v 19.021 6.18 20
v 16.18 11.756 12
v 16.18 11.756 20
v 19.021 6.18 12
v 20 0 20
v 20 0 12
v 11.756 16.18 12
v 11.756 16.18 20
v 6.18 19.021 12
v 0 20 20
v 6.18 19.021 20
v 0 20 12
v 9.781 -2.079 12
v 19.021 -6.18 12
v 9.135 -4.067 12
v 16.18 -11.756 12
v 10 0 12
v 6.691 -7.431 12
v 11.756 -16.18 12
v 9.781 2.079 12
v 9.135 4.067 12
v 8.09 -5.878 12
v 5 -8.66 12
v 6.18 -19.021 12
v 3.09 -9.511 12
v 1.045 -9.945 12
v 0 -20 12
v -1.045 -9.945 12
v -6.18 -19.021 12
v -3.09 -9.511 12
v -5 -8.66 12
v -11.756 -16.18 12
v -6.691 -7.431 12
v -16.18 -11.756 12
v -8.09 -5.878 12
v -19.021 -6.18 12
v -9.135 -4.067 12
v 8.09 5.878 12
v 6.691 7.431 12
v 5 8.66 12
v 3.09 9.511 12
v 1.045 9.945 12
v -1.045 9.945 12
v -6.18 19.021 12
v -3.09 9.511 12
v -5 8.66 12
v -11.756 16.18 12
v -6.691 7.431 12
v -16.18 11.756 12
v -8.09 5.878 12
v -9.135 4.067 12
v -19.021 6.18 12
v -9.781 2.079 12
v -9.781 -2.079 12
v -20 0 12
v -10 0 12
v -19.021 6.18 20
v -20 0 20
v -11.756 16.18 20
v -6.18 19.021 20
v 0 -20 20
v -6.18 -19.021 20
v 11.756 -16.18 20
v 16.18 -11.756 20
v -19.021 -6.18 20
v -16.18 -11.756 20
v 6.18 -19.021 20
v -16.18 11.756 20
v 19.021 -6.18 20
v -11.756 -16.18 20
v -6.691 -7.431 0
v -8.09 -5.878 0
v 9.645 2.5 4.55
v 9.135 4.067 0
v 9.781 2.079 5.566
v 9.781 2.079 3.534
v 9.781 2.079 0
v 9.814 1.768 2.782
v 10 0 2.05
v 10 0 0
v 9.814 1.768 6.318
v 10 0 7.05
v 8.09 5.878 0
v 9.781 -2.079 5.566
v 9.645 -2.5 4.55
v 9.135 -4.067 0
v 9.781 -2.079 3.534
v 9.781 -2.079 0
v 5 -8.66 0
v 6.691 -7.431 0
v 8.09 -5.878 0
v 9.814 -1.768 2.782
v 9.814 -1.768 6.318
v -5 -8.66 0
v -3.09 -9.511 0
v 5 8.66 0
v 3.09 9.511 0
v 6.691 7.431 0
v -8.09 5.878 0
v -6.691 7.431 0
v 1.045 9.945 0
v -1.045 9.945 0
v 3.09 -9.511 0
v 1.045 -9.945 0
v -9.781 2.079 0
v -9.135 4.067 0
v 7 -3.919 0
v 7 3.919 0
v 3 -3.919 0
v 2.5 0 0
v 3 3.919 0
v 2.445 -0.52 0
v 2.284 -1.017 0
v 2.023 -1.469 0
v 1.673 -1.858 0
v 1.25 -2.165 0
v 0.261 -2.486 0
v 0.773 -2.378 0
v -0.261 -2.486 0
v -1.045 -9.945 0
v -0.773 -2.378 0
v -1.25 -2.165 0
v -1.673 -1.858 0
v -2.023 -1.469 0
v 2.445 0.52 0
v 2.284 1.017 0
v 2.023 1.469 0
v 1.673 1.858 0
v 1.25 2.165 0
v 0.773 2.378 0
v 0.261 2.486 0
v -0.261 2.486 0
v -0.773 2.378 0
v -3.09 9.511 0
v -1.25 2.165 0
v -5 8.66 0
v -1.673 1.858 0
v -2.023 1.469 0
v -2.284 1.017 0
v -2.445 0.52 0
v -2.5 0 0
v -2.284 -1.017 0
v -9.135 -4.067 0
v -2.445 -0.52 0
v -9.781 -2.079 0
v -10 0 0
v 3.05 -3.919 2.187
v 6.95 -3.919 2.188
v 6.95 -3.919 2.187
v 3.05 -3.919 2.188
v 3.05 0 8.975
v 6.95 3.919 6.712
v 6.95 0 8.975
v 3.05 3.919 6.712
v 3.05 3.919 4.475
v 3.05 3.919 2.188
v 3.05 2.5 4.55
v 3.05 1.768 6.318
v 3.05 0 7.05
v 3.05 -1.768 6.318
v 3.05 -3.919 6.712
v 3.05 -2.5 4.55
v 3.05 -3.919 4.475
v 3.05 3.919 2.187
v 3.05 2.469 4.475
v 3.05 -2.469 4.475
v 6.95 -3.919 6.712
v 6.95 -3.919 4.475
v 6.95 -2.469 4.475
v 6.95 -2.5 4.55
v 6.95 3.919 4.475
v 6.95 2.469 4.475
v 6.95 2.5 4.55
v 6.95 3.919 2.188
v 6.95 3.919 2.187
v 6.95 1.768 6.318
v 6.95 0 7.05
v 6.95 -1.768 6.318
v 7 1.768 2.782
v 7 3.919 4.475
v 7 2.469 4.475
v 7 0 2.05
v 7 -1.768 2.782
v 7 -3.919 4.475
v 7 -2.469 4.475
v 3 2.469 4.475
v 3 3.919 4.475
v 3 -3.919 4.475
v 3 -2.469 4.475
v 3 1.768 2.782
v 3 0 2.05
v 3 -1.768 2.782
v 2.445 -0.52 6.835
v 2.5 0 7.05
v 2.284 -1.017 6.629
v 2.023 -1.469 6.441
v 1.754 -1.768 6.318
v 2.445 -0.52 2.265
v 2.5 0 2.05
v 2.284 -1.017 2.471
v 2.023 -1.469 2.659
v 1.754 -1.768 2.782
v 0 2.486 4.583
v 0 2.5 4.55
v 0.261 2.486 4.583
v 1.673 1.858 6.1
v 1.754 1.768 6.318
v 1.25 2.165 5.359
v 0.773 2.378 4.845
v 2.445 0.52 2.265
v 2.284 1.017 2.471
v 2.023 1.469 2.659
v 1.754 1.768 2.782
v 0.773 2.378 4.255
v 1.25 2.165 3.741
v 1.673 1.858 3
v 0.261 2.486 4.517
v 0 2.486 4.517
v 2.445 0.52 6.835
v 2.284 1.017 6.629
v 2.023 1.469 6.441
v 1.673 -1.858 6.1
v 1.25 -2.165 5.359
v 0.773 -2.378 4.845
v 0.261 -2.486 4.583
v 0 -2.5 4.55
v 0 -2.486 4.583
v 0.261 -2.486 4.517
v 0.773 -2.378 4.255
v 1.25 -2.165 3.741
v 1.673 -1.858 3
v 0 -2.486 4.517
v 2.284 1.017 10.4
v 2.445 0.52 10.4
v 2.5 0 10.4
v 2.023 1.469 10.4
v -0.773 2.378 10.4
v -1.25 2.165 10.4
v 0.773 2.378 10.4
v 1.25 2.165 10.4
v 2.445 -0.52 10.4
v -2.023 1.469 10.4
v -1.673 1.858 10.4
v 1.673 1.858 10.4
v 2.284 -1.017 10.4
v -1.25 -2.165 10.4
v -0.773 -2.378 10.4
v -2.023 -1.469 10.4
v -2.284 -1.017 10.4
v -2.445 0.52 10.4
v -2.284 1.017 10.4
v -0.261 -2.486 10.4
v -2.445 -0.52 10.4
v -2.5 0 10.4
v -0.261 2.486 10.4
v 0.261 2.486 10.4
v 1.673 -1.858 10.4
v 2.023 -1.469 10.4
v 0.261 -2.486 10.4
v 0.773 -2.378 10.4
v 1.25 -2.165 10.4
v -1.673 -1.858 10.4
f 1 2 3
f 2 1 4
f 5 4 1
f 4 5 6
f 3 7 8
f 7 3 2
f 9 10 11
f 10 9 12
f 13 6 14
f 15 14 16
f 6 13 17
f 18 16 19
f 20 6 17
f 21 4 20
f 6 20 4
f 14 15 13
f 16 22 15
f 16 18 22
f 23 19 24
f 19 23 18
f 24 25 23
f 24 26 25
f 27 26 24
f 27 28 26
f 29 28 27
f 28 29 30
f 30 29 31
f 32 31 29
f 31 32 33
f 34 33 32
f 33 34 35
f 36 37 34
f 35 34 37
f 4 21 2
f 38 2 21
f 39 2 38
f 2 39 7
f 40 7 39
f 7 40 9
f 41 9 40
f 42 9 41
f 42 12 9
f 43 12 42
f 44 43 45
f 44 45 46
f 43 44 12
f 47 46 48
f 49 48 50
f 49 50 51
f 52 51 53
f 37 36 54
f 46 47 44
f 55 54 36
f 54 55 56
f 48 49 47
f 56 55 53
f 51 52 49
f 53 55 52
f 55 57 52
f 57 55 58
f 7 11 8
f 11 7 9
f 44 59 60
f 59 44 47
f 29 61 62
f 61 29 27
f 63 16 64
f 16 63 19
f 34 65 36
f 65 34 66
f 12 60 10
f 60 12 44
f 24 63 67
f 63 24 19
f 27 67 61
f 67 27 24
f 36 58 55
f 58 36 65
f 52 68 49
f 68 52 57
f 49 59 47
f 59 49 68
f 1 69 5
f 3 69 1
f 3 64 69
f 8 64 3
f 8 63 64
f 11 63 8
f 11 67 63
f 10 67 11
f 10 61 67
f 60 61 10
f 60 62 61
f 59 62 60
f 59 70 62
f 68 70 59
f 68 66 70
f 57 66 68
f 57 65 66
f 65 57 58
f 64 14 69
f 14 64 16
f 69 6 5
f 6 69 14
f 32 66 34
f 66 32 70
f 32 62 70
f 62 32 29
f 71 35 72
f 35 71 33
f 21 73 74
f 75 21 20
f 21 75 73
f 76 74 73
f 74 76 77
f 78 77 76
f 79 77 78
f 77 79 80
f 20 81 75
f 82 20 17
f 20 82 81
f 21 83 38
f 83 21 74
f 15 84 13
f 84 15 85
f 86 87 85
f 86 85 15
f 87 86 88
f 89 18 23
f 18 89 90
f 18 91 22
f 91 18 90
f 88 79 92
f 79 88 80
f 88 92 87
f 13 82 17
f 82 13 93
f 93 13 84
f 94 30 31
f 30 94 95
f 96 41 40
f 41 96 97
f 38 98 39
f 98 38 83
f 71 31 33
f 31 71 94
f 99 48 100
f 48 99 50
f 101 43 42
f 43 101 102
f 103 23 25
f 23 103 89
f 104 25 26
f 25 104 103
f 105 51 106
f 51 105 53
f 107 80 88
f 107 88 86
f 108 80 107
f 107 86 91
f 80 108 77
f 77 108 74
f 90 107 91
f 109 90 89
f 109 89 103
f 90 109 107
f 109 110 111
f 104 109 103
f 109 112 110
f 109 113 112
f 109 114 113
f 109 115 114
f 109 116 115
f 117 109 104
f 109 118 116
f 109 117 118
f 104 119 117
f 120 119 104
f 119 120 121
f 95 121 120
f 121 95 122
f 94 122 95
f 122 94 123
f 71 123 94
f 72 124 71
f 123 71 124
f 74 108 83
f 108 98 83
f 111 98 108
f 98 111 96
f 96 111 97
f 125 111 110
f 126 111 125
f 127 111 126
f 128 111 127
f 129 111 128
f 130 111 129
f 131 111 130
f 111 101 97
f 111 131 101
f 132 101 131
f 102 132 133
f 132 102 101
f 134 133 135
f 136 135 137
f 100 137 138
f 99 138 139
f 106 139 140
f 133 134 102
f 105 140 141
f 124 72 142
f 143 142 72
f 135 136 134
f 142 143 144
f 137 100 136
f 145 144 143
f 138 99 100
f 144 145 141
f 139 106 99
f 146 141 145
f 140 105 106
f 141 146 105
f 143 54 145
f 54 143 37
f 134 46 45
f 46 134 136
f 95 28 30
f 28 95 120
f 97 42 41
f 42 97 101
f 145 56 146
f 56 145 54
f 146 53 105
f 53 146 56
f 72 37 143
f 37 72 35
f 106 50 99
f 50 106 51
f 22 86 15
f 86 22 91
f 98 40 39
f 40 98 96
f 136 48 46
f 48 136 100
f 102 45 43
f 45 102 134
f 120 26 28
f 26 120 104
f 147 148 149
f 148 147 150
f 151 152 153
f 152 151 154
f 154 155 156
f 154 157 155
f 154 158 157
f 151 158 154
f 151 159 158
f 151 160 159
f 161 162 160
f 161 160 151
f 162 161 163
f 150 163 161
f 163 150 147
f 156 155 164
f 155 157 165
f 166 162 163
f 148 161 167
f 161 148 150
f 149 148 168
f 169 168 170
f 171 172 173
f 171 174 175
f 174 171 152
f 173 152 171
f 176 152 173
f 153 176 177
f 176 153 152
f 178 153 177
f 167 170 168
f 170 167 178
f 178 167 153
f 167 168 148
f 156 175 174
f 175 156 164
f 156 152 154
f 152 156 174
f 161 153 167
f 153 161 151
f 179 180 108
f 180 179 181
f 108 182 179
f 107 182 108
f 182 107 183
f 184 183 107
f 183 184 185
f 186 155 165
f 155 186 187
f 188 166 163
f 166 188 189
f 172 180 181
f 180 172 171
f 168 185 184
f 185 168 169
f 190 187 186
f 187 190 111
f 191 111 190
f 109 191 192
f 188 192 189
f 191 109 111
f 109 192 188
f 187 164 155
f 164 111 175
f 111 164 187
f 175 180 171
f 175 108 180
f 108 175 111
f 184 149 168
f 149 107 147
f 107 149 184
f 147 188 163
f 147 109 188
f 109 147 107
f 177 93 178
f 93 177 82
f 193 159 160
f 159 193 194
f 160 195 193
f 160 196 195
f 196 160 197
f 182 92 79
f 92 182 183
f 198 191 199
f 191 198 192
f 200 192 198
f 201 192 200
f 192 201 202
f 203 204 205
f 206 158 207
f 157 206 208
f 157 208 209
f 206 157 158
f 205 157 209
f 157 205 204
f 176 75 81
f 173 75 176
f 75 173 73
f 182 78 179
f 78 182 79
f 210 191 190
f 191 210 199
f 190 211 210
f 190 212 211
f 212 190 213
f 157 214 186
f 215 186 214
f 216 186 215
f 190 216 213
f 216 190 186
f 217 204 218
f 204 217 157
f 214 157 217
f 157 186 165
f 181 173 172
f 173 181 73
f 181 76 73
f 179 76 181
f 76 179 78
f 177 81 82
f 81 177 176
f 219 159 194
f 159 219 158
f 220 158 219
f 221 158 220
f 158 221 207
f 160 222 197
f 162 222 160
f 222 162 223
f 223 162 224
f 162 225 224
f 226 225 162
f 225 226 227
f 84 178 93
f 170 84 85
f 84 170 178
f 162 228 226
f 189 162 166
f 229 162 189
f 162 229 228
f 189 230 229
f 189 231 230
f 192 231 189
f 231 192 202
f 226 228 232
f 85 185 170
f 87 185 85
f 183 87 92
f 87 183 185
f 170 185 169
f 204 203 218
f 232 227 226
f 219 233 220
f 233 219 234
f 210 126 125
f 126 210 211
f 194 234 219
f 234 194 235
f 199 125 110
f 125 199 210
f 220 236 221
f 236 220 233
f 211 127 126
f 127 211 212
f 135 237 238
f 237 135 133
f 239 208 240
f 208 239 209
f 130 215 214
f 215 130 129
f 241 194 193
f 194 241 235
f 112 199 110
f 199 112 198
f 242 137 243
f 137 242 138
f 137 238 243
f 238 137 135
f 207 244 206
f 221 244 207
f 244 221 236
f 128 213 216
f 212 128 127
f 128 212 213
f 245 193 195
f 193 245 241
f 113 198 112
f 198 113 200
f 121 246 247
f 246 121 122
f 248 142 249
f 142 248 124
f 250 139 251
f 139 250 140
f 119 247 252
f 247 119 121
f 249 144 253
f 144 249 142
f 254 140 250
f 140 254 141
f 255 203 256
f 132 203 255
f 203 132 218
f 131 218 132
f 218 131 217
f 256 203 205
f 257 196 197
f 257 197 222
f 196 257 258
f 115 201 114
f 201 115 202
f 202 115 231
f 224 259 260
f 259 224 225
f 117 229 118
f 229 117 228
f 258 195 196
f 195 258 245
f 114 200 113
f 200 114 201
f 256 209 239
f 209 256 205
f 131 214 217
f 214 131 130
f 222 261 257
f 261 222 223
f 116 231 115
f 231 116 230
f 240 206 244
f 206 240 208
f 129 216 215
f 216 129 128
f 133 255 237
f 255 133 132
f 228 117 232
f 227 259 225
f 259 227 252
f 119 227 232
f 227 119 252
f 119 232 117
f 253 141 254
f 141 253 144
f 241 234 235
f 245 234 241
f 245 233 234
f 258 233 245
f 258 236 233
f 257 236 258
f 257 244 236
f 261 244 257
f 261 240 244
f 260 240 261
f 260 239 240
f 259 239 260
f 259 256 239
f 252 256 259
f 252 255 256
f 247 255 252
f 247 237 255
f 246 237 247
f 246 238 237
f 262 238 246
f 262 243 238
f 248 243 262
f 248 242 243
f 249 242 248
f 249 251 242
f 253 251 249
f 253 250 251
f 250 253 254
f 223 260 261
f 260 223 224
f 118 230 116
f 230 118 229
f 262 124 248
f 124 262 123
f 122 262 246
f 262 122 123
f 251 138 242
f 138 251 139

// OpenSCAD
// Tested on a 5mm shaft and it works! Fits very sungly.

trap_nut_depth = 9.1;

// nut measures: 7.91 flat faces, 9.05 pointed faces, 3.8 thick
// TODO merge this into a library module, and increase 9.05 figure slightly
// because it's too tight (plus, probably more natural to specify the small
// dimension and derive the large one).

// screw, nut thick, wide (tips)
M5 = [5, 3.9, 9.05];
gCos30 = 0.866; // math.cos(pi/6 or 30 deg)

// Screw axis is at z=0, nut itself is centered on origin.
module TrapNut(x, d) {
  // nut-shaped bottom
  rotate([0,90,0]) cylinder(r=x[2]/2, h=x[1], $fn=6, center=true);
  // entrance hole (slightly larger)
  translate([0,0,-x[2]/2])
    cube([x[1]+0.1, x[2]*gCos30, d], center=true);
}

difference() {
  union() {
    // handle part
    translate([0,0,8/2+12]) cylinder(r=20, h=8, center=true, $fn=20);
    // shaft part
    translate([0,0,7]) cylinder(r=10, h=14, center=true);
    // For checking that the part lays on z=0
    // color([0.5,0.5,0.5,0.4]) translate([0,0,-1/2]) cube([50,50,1], center=true);
  }
  // trap nut hole
  translate([5, 0, trap_nut_depth/2-0.1])
    TrapNut(M5, trap_nut_depth);
  // screw hole
  #translate([20/2,0,trap_nut_depth/2])
    rotate([0,90,0])
      cylinder(r=M5[0]/2, h=20, center=true);
  // motor hole
  translate([0,0,10.5/2-0.1])cylinder(r=5/2,h=10.5,center=true,$fn=30);
}
